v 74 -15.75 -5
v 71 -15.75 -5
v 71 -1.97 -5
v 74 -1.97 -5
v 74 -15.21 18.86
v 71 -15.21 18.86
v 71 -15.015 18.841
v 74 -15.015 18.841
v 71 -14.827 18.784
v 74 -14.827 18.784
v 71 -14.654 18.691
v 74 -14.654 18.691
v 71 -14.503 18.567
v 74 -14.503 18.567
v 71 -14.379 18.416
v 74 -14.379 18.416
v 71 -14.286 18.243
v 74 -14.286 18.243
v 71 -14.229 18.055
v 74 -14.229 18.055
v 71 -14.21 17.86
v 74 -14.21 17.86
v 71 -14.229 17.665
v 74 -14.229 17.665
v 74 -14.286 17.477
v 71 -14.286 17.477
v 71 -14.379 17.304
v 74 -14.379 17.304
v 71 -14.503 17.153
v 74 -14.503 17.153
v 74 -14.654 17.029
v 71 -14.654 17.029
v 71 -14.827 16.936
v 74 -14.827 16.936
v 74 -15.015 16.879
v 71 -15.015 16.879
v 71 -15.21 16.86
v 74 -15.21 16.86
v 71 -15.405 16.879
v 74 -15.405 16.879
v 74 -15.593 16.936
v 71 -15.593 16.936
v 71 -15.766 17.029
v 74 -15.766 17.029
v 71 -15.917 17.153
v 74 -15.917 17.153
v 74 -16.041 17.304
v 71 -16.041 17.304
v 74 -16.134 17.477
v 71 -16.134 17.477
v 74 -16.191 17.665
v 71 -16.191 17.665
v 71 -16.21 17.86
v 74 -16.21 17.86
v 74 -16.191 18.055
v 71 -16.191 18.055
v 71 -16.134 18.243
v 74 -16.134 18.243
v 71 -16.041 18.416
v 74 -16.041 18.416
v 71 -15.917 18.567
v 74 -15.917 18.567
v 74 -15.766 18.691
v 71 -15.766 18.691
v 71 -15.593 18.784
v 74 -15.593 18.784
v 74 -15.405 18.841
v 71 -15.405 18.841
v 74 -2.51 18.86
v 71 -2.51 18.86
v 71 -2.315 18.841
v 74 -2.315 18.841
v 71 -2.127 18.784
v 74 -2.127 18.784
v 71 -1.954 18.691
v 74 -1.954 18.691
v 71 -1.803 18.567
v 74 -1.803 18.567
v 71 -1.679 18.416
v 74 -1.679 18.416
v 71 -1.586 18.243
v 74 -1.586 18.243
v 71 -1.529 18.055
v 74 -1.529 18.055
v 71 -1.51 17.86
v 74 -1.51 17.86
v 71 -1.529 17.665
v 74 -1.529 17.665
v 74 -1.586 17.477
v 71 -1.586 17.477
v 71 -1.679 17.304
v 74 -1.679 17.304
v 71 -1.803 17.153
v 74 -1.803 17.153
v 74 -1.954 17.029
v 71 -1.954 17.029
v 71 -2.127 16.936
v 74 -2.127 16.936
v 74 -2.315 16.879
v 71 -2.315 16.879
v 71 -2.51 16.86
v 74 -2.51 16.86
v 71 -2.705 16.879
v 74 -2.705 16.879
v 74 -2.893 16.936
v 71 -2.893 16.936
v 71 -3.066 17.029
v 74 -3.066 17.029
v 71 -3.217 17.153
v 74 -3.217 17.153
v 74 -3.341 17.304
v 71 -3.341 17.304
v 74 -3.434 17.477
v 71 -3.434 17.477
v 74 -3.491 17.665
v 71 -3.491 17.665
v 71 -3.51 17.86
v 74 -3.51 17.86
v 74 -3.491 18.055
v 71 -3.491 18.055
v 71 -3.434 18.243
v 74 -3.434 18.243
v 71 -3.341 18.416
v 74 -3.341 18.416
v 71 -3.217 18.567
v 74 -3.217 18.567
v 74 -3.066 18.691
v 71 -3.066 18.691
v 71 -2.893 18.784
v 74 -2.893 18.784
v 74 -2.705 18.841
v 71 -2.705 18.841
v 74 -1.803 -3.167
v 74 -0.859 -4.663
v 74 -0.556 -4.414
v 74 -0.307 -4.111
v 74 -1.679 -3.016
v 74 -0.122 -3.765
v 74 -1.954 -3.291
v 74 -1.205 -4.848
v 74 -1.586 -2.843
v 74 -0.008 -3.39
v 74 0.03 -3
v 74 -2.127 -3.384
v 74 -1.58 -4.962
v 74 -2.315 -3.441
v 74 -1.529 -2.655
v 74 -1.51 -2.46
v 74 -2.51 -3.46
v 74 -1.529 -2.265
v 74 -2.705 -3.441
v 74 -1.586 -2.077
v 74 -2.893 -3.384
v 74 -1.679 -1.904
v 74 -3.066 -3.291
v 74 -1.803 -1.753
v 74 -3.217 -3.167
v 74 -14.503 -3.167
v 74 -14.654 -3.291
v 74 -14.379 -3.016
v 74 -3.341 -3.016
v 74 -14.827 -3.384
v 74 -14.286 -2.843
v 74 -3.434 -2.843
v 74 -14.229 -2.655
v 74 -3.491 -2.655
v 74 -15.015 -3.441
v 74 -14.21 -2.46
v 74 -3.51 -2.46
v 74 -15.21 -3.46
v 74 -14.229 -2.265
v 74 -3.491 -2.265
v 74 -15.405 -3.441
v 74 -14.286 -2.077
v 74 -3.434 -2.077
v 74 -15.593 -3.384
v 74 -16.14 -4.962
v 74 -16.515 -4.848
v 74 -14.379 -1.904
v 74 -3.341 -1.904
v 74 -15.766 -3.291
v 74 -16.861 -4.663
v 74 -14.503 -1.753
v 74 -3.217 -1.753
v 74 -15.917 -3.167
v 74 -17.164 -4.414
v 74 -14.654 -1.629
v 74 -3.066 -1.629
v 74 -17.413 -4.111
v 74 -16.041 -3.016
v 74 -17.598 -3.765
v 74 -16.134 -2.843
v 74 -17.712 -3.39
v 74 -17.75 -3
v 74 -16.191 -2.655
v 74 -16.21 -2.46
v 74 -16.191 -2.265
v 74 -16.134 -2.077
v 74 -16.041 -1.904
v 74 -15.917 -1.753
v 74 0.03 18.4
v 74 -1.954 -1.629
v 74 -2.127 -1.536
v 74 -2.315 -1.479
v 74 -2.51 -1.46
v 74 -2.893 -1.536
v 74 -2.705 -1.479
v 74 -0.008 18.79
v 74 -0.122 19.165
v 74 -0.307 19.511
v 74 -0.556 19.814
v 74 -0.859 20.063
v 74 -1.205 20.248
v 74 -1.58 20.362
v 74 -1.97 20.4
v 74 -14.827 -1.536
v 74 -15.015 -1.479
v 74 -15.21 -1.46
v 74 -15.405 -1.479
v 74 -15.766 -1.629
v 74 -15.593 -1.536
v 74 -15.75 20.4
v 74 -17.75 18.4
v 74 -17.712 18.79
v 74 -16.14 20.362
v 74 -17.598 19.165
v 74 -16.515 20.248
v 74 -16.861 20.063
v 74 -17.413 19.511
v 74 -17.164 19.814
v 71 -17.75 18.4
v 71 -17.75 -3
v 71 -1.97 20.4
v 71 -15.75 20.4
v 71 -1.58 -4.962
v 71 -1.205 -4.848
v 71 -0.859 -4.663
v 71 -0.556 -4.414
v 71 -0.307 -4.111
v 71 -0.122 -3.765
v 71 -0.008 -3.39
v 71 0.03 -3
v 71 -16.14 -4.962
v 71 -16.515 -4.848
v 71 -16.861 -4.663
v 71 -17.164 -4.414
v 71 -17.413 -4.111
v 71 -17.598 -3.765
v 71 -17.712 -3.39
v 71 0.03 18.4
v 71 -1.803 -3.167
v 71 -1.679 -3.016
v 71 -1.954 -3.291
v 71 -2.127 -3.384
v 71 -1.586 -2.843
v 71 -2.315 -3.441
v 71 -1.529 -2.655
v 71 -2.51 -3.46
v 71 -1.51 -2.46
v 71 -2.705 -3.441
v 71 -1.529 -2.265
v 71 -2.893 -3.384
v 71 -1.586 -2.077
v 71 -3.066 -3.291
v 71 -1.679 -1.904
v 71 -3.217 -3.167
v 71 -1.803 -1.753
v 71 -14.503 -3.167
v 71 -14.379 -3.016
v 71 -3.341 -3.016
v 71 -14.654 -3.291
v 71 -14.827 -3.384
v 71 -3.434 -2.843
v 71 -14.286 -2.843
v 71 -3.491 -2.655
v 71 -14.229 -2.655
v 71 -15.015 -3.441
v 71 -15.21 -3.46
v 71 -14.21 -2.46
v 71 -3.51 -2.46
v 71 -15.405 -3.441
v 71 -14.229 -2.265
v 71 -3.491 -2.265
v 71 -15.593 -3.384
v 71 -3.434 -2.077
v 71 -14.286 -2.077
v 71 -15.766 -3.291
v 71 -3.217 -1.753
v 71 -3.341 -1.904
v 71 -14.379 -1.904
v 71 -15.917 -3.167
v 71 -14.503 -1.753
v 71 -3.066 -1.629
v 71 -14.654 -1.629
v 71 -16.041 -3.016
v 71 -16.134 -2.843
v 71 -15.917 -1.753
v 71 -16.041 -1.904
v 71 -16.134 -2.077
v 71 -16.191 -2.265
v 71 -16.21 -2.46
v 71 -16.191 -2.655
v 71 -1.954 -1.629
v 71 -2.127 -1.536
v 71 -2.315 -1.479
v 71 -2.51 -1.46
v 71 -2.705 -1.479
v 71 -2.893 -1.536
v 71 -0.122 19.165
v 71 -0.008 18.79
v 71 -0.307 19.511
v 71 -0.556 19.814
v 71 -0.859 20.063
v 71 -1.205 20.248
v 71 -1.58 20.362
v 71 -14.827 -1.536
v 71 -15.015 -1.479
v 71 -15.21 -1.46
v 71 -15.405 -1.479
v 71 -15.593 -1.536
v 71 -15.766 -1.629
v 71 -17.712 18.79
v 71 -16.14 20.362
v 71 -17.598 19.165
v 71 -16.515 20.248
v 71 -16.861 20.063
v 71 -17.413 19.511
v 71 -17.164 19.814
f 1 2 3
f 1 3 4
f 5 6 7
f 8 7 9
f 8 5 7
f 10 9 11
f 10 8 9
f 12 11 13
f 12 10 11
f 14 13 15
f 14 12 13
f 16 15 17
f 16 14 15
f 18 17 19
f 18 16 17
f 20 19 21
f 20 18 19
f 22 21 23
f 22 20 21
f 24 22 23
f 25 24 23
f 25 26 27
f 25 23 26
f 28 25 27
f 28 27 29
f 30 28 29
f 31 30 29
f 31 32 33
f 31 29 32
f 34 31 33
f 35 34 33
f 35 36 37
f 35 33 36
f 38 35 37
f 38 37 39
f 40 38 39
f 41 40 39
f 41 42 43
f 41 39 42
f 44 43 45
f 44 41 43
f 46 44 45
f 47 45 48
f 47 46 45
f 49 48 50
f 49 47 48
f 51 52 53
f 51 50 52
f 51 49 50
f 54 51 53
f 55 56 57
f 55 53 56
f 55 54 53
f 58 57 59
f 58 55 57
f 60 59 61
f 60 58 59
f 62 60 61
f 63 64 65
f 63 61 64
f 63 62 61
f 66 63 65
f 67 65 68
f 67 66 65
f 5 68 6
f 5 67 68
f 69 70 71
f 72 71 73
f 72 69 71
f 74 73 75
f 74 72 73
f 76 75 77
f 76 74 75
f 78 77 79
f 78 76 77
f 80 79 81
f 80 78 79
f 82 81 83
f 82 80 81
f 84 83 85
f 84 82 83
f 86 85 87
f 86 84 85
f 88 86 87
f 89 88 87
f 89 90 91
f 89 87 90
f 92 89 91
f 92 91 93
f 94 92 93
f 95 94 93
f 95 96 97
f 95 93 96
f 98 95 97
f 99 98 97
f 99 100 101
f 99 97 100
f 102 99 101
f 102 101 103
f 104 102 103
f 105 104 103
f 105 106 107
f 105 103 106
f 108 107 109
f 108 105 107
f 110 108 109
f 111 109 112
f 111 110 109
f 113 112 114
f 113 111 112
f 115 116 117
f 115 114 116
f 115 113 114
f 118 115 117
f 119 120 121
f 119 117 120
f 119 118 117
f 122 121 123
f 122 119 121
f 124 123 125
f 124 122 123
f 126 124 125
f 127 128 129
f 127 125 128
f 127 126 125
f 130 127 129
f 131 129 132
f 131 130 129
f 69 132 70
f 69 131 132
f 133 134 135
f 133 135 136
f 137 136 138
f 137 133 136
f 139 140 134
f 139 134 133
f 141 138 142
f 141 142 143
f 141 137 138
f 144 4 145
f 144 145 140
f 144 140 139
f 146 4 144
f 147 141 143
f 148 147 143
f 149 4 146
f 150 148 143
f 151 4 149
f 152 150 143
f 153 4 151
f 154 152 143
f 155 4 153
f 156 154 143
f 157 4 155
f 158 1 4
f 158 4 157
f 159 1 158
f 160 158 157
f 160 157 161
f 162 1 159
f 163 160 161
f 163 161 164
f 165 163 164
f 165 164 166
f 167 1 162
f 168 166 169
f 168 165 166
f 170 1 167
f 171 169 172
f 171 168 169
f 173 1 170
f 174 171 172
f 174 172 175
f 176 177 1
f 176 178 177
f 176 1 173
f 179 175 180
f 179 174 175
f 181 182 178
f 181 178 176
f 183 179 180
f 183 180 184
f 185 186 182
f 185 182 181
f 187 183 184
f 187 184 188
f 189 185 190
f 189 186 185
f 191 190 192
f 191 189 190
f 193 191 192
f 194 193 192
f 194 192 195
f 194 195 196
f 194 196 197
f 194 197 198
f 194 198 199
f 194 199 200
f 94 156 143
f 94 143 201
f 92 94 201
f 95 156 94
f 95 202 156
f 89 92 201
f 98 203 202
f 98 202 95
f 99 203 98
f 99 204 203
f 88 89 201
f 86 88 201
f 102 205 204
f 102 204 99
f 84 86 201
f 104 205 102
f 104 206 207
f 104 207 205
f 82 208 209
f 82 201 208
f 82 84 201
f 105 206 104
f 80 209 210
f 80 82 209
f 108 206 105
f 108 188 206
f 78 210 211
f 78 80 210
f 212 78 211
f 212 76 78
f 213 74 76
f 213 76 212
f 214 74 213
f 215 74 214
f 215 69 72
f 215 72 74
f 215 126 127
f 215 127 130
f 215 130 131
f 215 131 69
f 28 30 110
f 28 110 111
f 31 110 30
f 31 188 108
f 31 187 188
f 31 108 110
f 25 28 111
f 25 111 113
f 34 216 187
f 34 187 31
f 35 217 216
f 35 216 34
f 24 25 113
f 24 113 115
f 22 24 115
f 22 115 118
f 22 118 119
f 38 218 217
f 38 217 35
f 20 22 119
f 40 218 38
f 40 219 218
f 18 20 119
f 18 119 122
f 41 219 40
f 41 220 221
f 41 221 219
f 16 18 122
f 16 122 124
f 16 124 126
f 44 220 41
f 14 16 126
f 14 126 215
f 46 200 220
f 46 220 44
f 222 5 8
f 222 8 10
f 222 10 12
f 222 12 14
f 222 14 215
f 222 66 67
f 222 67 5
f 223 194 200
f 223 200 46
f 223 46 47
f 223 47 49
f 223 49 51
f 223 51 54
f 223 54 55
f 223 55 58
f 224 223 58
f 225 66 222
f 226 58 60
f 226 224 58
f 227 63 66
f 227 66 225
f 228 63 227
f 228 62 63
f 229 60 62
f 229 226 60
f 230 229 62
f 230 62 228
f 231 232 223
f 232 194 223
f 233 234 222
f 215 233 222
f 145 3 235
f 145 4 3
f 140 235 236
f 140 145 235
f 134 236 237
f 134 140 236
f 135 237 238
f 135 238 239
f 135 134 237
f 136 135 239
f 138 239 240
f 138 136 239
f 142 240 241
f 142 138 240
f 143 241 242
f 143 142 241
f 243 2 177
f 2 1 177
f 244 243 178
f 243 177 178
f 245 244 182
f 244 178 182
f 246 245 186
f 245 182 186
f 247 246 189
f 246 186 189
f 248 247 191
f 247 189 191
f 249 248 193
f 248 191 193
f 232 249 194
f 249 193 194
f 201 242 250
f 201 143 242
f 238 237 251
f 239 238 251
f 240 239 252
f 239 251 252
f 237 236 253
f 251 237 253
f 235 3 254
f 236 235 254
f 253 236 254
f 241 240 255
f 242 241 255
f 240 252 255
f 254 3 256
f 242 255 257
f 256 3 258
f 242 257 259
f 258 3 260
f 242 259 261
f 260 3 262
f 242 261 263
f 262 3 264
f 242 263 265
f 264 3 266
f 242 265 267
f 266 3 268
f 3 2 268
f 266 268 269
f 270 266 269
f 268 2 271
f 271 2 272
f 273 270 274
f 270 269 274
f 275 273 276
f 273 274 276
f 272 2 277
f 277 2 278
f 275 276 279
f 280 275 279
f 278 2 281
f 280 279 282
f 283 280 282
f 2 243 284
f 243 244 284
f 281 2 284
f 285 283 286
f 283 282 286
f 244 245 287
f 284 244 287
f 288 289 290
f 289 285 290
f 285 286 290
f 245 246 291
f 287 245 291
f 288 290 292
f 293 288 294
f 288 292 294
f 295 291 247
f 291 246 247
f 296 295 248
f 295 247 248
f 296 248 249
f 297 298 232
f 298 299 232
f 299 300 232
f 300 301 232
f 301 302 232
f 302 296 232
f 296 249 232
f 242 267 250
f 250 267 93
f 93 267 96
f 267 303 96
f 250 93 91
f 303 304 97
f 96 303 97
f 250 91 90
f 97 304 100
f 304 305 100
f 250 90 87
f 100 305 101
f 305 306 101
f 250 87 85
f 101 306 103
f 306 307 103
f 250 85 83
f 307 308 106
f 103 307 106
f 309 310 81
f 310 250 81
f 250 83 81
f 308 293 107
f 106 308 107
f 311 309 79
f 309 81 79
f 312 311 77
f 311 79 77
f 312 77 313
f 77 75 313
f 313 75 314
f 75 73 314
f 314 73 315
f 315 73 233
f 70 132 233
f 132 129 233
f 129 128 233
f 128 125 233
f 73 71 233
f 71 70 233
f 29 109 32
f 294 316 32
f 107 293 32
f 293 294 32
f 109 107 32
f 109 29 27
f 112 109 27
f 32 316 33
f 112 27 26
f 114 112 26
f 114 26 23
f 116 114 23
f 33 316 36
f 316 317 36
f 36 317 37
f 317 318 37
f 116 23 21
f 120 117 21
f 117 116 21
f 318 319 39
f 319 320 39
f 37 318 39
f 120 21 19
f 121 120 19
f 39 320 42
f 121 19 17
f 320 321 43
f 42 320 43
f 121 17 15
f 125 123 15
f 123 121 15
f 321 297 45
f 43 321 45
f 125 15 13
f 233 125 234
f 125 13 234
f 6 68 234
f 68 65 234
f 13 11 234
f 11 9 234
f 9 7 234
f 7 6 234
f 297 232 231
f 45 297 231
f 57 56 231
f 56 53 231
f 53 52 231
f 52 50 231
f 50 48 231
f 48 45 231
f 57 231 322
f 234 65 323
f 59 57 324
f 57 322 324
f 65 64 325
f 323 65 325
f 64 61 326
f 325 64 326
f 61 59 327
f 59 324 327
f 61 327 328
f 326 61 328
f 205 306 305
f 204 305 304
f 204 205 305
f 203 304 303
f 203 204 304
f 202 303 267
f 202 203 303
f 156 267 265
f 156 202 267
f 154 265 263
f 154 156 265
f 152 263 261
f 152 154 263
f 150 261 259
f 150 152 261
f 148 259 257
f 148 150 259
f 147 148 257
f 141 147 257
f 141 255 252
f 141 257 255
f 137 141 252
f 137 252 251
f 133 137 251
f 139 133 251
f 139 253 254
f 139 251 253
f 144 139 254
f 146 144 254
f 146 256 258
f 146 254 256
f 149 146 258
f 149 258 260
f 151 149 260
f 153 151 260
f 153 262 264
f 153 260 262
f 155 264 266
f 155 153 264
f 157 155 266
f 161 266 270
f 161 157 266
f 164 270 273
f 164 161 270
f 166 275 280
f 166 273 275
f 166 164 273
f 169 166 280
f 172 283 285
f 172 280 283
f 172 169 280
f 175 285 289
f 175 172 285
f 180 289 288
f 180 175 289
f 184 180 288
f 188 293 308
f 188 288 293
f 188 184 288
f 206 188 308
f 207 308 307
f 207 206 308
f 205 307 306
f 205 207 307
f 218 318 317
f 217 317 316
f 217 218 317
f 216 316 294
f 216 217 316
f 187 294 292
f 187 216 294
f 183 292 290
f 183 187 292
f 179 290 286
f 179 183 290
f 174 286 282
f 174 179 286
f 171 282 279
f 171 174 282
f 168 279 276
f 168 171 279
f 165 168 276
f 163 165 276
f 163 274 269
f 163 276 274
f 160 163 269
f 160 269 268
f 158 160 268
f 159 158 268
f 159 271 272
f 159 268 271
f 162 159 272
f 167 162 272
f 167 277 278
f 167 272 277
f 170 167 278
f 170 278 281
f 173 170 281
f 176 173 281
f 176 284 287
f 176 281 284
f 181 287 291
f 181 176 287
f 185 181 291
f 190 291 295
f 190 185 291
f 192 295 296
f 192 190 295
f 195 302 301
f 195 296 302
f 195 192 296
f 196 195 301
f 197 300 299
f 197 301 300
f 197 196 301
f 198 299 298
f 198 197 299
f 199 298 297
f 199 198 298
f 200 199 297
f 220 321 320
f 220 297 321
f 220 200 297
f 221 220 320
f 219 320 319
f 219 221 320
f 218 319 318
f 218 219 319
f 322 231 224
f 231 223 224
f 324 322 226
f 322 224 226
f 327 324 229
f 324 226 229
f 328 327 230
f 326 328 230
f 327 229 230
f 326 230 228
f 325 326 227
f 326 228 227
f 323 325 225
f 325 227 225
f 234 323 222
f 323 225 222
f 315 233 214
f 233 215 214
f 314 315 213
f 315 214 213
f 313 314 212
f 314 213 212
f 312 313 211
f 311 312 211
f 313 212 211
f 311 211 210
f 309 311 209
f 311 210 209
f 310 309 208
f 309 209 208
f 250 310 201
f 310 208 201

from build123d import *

# Parameters (mm, degrees)
CYLINDER004_R             = 1
CYLINDER004_DEPTH         = 10
CYLINDER005_R             = 1
CYLINDER005_DEPTH         = 10
CYLINDER006_R             = 1
CYLINDER006_DEPTH         = 10
CYLINDER007_R             = 1
CYLINDER007_DEPTH         = 10
BOX003_W                  = 25.4
BOX003_H                  = 3
BOX003_DEPTH              = 17.78
FILLET_R                  = 2
FILLET001_R               = 2
FILLET002_R               = 2
FILLET003_R               = 2
FILLET003_PITCH_ANGLE     = -90
FILLET003_PLACEMENT_ANGLE = -90


with BuildPart() as cylinder004:
    # Cylinder004 → Cylinder004 (new body)
    with BuildSketch(Plane(origin=(2.54, 0, 2.54), x_dir=(1, 0, 0), z_dir=(0, -1, 0))):
        Circle(CYLINDER004_R)
    extrude(amount=CYLINDER004_DEPTH)


with BuildPart() as fusion011:
    # Cylinder005 → Cylinder005 (new body)
    with BuildSketch(Plane(origin=(2.54, 0, 15.24), x_dir=(1, 0, 0), z_dir=(0, -1, 0))):
        Circle(CYLINDER005_R)
    extrude(amount=CYLINDER005_DEPTH)

    # Fusion011: union Cylinder004
    add(cylinder004.part)


with BuildPart() as cylinder006:
    # Cylinder006 → Cylinder006 (new body)
    with BuildSketch(Plane(origin=(2.54, 0, 2.54), x_dir=(1, 0, 0), z_dir=(0, -1, 0))):
        Circle(CYLINDER006_R)
    extrude(amount=CYLINDER006_DEPTH)


with BuildPart() as fusion013:
    # Cylinder007 → Cylinder007 (new body)
    with BuildSketch(Plane(origin=(2.54, 0, 15.24), x_dir=(1, 0, 0), z_dir=(0, -1, 0))):
        Circle(CYLINDER007_R)
    extrude(amount=CYLINDER007_DEPTH)

    # Fusion012: union Cylinder006
    add(cylinder006.part)


with BuildPart() as fusion013_1:
    # Fusion012 placement: moved
    add(fusion013.part.moved(Location((20.32, 0, 0))))

    # Fusion013: union Fusion011
    add(fusion011.part)


with BuildPart() as fusion013_2:
    # Fusion013 placement: moved
    add(fusion013_1.part.moved(Location((0, 3, 0))))


with BuildPart() as bme280adafruit:
    # Box003 → Box003 (new body)
    with BuildSketch(Plane.XY):
        with Locations((12.7, 1.5)):
            Rectangle(BOX003_W, BOX003_H)
    extrude(amount=BOX003_DEPTH)

    # Cut: cut Fusion013
    add(fusion013_2.part, mode=Mode.SUBTRACT)

    # Fillet
    fillet_edges = [bme280adafruit.edges().sort_by_distance(p)[0] for p in [
        (0, 1.5, 17.78),
    ]]
    fillet(fillet_edges, radius=FILLET_R)

    # Fillet001
    fillet001_edges = [bme280adafruit.edges().sort_by_distance(p)[0] for p in [
        (0, 1.5, 0),
    ]]
    fillet(fillet001_edges, radius=FILLET001_R)

    # Fillet002
    fillet002_edges = [bme280adafruit.edges().sort_by_distance(p)[0] for p in [
        (25.4, 1.5, 0),
    ]]
    fillet(fillet002_edges, radius=FILLET002_R)

    # Fillet003
    fillet003_edges = [bme280adafruit.edges().sort_by_distance(p)[0] for p in [
        (25.4, 1.5, 17.78),
    ]]
    fillet(fillet003_edges, radius=FILLET003_R)


with BuildPart() as bme280adafruit_1:
    # Fillet003 pitch: moved
    add(bme280adafruit.part.rotate(Axis((0, 0, 0), (0, 1, 0)), FILLET003_PITCH_ANGLE))


with BuildPart() as bme280adafruit_2:
    # Fillet003 placement: moved
    add(bme280adafruit_1.part.moved(Location((71, -17.75, -5))).rotate(Axis((71, -17.75, -5), (0, 0, 1)), FILLET003_PLACEMENT_ANGLE))


solid = bme280adafruit_2.part
